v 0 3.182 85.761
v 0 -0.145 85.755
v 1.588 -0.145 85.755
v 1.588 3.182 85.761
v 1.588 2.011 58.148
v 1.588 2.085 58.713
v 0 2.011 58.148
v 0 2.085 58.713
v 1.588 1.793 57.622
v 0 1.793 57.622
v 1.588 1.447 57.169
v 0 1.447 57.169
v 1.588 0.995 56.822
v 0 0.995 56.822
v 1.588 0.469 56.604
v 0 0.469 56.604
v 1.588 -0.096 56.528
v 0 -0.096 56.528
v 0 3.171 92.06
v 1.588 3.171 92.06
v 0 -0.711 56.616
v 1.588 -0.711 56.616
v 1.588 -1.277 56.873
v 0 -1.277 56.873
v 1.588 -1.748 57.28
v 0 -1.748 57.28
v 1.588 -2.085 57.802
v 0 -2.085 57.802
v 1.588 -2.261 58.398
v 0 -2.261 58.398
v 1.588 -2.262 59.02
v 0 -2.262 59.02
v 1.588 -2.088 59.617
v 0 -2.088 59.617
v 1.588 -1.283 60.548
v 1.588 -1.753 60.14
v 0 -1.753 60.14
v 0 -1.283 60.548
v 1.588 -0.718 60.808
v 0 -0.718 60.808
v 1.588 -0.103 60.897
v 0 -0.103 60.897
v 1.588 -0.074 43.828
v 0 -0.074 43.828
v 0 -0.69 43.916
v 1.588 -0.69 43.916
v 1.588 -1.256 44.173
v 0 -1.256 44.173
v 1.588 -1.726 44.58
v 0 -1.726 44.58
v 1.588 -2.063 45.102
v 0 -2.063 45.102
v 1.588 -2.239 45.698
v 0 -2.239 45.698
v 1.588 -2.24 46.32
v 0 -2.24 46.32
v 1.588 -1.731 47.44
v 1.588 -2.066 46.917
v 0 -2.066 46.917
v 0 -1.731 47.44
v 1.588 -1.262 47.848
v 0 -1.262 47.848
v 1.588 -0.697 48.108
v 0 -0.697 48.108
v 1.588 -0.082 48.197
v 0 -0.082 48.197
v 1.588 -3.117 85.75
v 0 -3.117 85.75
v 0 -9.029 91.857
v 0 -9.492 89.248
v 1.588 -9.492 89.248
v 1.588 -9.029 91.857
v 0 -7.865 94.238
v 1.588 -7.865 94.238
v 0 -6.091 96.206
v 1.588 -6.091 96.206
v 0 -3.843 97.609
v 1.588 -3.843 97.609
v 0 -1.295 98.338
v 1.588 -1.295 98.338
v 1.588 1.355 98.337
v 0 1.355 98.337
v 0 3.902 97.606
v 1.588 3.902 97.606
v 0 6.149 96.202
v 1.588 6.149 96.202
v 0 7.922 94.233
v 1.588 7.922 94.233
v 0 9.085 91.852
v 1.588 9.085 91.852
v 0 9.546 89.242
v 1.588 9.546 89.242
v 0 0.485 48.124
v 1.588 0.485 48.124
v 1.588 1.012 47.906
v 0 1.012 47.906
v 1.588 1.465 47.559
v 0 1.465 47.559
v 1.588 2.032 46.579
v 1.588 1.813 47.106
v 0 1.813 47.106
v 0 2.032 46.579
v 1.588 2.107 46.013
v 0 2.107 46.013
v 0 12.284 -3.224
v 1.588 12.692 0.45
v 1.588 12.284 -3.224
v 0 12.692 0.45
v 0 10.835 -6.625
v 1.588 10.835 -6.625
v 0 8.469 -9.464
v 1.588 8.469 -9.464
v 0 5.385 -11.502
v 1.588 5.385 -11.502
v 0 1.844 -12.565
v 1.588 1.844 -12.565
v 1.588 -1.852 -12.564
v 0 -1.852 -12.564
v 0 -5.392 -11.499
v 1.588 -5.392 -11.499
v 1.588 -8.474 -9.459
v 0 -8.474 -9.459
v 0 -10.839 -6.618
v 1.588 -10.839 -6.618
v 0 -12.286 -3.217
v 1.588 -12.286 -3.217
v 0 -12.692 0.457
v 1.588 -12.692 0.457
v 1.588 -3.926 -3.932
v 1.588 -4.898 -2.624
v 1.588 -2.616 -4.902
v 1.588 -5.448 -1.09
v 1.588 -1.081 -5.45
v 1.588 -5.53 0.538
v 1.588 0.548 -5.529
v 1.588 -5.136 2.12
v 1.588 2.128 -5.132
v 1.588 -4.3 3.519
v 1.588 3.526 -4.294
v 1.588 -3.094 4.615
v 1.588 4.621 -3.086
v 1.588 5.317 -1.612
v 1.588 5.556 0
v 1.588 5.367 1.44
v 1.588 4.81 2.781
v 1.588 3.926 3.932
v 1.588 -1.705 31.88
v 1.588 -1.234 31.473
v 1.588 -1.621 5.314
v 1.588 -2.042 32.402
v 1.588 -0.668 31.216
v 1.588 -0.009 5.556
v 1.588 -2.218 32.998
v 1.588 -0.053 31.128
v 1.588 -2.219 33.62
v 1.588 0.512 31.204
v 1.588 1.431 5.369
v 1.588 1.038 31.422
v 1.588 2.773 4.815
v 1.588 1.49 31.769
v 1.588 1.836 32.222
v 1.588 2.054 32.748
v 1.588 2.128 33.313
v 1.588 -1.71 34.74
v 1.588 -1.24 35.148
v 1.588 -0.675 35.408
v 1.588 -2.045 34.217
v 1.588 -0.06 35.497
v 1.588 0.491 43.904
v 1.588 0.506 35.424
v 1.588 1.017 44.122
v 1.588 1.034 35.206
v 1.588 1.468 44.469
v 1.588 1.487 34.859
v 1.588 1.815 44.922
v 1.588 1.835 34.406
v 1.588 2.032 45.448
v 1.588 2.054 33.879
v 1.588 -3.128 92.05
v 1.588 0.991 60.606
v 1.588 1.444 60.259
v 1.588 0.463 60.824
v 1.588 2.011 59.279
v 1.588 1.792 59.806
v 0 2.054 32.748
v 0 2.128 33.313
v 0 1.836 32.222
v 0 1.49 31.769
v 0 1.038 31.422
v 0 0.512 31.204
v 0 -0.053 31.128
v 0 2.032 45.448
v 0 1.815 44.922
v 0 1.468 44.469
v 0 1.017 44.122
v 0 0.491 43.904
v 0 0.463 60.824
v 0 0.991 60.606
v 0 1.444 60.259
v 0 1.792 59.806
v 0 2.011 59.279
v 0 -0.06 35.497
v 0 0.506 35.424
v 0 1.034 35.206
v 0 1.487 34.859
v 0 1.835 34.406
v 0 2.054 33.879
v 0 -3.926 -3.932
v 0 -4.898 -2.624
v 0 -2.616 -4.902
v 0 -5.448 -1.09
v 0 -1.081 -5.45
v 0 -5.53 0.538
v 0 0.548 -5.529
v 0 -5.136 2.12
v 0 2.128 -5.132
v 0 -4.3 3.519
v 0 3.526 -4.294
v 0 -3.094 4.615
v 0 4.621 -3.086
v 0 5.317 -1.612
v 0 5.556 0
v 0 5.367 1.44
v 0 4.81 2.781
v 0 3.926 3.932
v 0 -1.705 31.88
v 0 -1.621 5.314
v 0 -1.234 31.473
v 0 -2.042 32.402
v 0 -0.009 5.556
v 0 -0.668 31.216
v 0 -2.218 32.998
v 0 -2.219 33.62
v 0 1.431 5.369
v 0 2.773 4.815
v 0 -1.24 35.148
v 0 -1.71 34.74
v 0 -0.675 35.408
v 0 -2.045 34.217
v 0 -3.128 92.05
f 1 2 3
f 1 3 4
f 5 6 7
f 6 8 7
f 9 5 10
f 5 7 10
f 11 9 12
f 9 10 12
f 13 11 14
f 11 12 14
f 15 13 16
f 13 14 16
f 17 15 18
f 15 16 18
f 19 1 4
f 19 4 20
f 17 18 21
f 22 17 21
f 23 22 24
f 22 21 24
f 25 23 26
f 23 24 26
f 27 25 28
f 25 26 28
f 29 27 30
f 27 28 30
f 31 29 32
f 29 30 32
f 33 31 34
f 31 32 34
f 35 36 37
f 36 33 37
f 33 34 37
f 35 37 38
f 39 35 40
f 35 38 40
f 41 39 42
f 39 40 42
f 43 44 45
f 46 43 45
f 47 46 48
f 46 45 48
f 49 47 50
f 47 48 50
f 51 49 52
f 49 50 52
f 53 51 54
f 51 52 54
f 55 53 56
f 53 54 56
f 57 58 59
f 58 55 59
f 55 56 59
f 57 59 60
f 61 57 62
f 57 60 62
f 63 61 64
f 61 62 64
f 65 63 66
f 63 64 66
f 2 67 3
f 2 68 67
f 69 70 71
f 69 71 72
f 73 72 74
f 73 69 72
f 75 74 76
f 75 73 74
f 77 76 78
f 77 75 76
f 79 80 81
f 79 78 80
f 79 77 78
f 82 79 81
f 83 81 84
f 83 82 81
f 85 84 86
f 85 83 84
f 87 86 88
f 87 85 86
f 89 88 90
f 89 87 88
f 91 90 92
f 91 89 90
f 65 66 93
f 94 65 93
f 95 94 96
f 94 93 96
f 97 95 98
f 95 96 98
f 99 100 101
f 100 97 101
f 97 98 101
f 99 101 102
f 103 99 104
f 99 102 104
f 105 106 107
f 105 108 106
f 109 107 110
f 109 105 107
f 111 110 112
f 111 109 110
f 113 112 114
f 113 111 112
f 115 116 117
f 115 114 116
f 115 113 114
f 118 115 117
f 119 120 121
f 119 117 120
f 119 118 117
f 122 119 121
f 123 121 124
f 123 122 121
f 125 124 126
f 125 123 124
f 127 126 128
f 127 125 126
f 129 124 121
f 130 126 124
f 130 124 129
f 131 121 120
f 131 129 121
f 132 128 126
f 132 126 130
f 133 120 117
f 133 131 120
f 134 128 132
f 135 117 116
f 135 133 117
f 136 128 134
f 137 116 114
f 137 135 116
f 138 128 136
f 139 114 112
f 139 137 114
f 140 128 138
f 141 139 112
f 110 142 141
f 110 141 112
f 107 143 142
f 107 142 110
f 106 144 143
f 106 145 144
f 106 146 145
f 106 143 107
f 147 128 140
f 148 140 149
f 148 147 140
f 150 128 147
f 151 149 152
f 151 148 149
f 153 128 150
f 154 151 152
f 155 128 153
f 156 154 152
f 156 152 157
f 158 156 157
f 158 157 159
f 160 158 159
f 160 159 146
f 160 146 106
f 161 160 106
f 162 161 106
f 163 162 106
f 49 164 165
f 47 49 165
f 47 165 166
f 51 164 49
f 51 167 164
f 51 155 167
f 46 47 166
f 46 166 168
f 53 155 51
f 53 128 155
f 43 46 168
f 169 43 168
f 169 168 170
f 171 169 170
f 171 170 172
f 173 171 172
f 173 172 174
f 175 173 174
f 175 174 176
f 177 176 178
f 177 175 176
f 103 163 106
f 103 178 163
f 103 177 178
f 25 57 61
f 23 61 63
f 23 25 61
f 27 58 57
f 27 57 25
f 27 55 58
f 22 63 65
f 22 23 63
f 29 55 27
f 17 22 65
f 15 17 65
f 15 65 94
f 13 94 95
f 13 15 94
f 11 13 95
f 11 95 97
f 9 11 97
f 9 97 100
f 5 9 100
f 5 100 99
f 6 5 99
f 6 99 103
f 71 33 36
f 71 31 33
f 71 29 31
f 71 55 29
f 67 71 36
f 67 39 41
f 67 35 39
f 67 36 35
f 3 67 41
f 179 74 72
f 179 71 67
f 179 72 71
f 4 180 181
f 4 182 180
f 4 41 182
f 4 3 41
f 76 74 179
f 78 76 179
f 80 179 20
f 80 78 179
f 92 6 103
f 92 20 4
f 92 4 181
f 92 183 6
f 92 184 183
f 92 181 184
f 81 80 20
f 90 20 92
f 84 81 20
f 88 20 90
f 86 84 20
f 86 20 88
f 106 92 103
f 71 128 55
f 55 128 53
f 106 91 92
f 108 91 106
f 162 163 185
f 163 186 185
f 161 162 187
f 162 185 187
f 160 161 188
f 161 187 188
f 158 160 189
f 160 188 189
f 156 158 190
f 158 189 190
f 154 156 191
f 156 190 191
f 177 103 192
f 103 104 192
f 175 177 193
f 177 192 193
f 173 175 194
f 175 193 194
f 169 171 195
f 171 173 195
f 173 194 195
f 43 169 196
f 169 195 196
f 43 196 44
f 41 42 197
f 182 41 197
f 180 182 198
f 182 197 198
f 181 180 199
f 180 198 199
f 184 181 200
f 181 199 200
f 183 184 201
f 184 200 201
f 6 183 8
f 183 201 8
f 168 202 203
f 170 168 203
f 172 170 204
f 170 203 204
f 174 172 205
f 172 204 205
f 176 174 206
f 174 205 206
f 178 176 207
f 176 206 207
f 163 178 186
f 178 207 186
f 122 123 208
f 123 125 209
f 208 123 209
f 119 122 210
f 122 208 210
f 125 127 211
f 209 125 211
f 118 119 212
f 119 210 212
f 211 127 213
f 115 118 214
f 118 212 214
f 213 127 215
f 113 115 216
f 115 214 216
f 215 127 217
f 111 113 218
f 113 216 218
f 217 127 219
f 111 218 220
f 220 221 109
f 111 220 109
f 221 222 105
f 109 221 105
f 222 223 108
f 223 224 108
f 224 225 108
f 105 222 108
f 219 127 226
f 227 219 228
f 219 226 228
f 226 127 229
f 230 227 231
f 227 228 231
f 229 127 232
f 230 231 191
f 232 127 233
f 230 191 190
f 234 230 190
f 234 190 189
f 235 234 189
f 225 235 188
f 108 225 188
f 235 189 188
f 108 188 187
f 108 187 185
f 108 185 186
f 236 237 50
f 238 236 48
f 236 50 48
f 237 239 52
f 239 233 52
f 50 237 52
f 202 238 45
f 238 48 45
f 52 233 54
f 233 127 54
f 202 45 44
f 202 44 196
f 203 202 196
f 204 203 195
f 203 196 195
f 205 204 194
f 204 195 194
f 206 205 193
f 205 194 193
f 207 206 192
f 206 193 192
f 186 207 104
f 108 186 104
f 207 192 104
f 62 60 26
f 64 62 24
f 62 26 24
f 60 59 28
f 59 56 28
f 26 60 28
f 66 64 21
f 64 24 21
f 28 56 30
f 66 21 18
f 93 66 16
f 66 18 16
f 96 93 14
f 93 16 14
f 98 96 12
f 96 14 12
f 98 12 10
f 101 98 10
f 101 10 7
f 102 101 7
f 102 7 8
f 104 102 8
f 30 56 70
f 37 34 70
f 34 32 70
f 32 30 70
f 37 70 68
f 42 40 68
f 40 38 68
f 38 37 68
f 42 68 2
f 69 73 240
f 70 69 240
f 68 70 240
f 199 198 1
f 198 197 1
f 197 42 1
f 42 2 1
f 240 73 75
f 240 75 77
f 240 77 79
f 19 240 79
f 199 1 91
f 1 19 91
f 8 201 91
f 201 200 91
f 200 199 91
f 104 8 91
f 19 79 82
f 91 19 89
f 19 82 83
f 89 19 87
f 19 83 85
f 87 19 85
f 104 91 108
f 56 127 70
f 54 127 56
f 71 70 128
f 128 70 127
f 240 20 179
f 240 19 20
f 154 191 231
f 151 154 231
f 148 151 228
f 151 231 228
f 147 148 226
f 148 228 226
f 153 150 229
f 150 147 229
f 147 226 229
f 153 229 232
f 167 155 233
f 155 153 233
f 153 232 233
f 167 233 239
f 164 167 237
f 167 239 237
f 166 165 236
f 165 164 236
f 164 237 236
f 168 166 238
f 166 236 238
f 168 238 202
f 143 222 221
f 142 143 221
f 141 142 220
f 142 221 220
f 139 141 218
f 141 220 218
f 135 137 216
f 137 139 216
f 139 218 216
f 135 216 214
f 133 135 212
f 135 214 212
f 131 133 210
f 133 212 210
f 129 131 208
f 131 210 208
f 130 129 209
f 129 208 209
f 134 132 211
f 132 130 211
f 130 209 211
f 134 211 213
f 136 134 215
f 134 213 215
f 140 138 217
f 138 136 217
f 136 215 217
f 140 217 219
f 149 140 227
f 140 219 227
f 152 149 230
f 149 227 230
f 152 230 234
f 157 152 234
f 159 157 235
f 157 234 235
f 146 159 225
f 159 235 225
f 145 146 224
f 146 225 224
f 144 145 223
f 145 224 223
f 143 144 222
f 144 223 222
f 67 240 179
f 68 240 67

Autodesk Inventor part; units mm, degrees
ref_plane "YZ Plane" through (0, 0, 0) normal (1, 0, 0) x (0, 1, 0)
ref_plane "XZ Plane" through (0, 0, 0) normal (0, 1, 0) x (-1, 0, 0)
ref_plane "XY Plane" through (0, 0, 0) normal (0, 0, 1) x (1, 0, 0)
sketch "main" plane through (0, 0, 0) normal (0, 0, 1) x (1, 0, 0)
  line L0 (46.0129, -12.1958) -> (-42.8871, -12.1958)
  circle A0 centre (46.0129, -12.1958) radius 5.5563
  arc A1 (45.534, -24.8867) -> (45.5846, 0.497) centre (46.0129, -12.1958) ccw
  line L1 (-46.0418, -15.1681) -> (-39.7426, -15.1681)
  line L2 (-39.7426, -15.1681) -> (-39.7426, -8.8689)
  line L3 (-39.7426, -8.8689) -> (-46.0418, -8.8689)
  line L4 (-46.0418, -8.8689) -> (-46.0418, -15.1681)
  line L5 (-46.0418, -15.1681) -> (-39.7426, -8.8689) construction
  line L6 (-39.7426, -15.1681) -> (-46.0418, -8.8689) construction
  arc A2 (-43.2133, -2.4989) -> (-43.2513, -21.5368) centre (-42.8922, -12.0185) ccw
  line L7 (-43.2133, -2.4989) -> (45.5846, 0.497)
  line L8 (-43.2513, -21.5368) -> (45.534, -24.8867)
  circle A3 centre (12.7, -12.1958) radius 2.1844
  circle A4 centre (0, -12.1958) radius 2.1844
  circle A5 centre (-12.7, -12.1958) radius 2.1844
  point P0 (-14.9546, -14.9924)
  point P1 (-63.2594, -31.7725)
  point P2 (-42.8922, -12.0185)
  dimension "d0" = 88.9
  dimension "d2" = 11.1125
  dimension "d3" = 25.4
  dimension "d4" = 6.2992
  dimension "d5" = 6.2992
  dimension "d6" = 19.05
  dimension "d9" = 4.3688
  dimension "d12" = 12.7
sketch "Sketch1" plane through (0, 0, 0) normal (1, 0, 0) x (0, 1, 0)
  line L0 (0, 0) -> (-0.1504, 88.8999)
  circle A0 centre (0, 0) radius 5.5563
  arc A1 (-12.6918, 0.4574) -> (12.692, 0.4497) centre (0, 0) ccw
  line L1 (-3.128, 92.0495) -> (-3.1174, 85.7503)
  line L2 (-3.1174, 85.7503) -> (3.1818, 85.7609)
  line L3 (3.1818, 85.7609) -> (3.1711, 92.0601)
  line L4 (3.1711, 92.0601) -> (-3.128, 92.0495)
  line L5 (-3.128, 92.0495) -> (3.1818, 85.7609) construction
  line L6 (-3.1174, 85.7503) -> (3.1711, 92.0601) construction
  arc A2 (9.5459, 89.2425) -> (-9.4919, 89.2482) centre (0.0269, 88.9052) ccw
  line L7 (9.5459, 89.2425) -> (12.692, 0.4497)
  line L8 (-9.4919, 89.2482) -> (-12.6918, 0.4574)
  circle A3 centre (-0.0563, 33.3128) radius 2.1844
  circle A4 centre (-0.0778, 46.0128) radius 2.1844
  circle A5 centre (-0.0993, 58.7128) radius 2.1844
  point P0 (0, 0)
extrude "Extrusion1" add sketch "Sketch1" along normal blind 1.5875
properties part number "Gusset" material "Acetal Resin, White"
